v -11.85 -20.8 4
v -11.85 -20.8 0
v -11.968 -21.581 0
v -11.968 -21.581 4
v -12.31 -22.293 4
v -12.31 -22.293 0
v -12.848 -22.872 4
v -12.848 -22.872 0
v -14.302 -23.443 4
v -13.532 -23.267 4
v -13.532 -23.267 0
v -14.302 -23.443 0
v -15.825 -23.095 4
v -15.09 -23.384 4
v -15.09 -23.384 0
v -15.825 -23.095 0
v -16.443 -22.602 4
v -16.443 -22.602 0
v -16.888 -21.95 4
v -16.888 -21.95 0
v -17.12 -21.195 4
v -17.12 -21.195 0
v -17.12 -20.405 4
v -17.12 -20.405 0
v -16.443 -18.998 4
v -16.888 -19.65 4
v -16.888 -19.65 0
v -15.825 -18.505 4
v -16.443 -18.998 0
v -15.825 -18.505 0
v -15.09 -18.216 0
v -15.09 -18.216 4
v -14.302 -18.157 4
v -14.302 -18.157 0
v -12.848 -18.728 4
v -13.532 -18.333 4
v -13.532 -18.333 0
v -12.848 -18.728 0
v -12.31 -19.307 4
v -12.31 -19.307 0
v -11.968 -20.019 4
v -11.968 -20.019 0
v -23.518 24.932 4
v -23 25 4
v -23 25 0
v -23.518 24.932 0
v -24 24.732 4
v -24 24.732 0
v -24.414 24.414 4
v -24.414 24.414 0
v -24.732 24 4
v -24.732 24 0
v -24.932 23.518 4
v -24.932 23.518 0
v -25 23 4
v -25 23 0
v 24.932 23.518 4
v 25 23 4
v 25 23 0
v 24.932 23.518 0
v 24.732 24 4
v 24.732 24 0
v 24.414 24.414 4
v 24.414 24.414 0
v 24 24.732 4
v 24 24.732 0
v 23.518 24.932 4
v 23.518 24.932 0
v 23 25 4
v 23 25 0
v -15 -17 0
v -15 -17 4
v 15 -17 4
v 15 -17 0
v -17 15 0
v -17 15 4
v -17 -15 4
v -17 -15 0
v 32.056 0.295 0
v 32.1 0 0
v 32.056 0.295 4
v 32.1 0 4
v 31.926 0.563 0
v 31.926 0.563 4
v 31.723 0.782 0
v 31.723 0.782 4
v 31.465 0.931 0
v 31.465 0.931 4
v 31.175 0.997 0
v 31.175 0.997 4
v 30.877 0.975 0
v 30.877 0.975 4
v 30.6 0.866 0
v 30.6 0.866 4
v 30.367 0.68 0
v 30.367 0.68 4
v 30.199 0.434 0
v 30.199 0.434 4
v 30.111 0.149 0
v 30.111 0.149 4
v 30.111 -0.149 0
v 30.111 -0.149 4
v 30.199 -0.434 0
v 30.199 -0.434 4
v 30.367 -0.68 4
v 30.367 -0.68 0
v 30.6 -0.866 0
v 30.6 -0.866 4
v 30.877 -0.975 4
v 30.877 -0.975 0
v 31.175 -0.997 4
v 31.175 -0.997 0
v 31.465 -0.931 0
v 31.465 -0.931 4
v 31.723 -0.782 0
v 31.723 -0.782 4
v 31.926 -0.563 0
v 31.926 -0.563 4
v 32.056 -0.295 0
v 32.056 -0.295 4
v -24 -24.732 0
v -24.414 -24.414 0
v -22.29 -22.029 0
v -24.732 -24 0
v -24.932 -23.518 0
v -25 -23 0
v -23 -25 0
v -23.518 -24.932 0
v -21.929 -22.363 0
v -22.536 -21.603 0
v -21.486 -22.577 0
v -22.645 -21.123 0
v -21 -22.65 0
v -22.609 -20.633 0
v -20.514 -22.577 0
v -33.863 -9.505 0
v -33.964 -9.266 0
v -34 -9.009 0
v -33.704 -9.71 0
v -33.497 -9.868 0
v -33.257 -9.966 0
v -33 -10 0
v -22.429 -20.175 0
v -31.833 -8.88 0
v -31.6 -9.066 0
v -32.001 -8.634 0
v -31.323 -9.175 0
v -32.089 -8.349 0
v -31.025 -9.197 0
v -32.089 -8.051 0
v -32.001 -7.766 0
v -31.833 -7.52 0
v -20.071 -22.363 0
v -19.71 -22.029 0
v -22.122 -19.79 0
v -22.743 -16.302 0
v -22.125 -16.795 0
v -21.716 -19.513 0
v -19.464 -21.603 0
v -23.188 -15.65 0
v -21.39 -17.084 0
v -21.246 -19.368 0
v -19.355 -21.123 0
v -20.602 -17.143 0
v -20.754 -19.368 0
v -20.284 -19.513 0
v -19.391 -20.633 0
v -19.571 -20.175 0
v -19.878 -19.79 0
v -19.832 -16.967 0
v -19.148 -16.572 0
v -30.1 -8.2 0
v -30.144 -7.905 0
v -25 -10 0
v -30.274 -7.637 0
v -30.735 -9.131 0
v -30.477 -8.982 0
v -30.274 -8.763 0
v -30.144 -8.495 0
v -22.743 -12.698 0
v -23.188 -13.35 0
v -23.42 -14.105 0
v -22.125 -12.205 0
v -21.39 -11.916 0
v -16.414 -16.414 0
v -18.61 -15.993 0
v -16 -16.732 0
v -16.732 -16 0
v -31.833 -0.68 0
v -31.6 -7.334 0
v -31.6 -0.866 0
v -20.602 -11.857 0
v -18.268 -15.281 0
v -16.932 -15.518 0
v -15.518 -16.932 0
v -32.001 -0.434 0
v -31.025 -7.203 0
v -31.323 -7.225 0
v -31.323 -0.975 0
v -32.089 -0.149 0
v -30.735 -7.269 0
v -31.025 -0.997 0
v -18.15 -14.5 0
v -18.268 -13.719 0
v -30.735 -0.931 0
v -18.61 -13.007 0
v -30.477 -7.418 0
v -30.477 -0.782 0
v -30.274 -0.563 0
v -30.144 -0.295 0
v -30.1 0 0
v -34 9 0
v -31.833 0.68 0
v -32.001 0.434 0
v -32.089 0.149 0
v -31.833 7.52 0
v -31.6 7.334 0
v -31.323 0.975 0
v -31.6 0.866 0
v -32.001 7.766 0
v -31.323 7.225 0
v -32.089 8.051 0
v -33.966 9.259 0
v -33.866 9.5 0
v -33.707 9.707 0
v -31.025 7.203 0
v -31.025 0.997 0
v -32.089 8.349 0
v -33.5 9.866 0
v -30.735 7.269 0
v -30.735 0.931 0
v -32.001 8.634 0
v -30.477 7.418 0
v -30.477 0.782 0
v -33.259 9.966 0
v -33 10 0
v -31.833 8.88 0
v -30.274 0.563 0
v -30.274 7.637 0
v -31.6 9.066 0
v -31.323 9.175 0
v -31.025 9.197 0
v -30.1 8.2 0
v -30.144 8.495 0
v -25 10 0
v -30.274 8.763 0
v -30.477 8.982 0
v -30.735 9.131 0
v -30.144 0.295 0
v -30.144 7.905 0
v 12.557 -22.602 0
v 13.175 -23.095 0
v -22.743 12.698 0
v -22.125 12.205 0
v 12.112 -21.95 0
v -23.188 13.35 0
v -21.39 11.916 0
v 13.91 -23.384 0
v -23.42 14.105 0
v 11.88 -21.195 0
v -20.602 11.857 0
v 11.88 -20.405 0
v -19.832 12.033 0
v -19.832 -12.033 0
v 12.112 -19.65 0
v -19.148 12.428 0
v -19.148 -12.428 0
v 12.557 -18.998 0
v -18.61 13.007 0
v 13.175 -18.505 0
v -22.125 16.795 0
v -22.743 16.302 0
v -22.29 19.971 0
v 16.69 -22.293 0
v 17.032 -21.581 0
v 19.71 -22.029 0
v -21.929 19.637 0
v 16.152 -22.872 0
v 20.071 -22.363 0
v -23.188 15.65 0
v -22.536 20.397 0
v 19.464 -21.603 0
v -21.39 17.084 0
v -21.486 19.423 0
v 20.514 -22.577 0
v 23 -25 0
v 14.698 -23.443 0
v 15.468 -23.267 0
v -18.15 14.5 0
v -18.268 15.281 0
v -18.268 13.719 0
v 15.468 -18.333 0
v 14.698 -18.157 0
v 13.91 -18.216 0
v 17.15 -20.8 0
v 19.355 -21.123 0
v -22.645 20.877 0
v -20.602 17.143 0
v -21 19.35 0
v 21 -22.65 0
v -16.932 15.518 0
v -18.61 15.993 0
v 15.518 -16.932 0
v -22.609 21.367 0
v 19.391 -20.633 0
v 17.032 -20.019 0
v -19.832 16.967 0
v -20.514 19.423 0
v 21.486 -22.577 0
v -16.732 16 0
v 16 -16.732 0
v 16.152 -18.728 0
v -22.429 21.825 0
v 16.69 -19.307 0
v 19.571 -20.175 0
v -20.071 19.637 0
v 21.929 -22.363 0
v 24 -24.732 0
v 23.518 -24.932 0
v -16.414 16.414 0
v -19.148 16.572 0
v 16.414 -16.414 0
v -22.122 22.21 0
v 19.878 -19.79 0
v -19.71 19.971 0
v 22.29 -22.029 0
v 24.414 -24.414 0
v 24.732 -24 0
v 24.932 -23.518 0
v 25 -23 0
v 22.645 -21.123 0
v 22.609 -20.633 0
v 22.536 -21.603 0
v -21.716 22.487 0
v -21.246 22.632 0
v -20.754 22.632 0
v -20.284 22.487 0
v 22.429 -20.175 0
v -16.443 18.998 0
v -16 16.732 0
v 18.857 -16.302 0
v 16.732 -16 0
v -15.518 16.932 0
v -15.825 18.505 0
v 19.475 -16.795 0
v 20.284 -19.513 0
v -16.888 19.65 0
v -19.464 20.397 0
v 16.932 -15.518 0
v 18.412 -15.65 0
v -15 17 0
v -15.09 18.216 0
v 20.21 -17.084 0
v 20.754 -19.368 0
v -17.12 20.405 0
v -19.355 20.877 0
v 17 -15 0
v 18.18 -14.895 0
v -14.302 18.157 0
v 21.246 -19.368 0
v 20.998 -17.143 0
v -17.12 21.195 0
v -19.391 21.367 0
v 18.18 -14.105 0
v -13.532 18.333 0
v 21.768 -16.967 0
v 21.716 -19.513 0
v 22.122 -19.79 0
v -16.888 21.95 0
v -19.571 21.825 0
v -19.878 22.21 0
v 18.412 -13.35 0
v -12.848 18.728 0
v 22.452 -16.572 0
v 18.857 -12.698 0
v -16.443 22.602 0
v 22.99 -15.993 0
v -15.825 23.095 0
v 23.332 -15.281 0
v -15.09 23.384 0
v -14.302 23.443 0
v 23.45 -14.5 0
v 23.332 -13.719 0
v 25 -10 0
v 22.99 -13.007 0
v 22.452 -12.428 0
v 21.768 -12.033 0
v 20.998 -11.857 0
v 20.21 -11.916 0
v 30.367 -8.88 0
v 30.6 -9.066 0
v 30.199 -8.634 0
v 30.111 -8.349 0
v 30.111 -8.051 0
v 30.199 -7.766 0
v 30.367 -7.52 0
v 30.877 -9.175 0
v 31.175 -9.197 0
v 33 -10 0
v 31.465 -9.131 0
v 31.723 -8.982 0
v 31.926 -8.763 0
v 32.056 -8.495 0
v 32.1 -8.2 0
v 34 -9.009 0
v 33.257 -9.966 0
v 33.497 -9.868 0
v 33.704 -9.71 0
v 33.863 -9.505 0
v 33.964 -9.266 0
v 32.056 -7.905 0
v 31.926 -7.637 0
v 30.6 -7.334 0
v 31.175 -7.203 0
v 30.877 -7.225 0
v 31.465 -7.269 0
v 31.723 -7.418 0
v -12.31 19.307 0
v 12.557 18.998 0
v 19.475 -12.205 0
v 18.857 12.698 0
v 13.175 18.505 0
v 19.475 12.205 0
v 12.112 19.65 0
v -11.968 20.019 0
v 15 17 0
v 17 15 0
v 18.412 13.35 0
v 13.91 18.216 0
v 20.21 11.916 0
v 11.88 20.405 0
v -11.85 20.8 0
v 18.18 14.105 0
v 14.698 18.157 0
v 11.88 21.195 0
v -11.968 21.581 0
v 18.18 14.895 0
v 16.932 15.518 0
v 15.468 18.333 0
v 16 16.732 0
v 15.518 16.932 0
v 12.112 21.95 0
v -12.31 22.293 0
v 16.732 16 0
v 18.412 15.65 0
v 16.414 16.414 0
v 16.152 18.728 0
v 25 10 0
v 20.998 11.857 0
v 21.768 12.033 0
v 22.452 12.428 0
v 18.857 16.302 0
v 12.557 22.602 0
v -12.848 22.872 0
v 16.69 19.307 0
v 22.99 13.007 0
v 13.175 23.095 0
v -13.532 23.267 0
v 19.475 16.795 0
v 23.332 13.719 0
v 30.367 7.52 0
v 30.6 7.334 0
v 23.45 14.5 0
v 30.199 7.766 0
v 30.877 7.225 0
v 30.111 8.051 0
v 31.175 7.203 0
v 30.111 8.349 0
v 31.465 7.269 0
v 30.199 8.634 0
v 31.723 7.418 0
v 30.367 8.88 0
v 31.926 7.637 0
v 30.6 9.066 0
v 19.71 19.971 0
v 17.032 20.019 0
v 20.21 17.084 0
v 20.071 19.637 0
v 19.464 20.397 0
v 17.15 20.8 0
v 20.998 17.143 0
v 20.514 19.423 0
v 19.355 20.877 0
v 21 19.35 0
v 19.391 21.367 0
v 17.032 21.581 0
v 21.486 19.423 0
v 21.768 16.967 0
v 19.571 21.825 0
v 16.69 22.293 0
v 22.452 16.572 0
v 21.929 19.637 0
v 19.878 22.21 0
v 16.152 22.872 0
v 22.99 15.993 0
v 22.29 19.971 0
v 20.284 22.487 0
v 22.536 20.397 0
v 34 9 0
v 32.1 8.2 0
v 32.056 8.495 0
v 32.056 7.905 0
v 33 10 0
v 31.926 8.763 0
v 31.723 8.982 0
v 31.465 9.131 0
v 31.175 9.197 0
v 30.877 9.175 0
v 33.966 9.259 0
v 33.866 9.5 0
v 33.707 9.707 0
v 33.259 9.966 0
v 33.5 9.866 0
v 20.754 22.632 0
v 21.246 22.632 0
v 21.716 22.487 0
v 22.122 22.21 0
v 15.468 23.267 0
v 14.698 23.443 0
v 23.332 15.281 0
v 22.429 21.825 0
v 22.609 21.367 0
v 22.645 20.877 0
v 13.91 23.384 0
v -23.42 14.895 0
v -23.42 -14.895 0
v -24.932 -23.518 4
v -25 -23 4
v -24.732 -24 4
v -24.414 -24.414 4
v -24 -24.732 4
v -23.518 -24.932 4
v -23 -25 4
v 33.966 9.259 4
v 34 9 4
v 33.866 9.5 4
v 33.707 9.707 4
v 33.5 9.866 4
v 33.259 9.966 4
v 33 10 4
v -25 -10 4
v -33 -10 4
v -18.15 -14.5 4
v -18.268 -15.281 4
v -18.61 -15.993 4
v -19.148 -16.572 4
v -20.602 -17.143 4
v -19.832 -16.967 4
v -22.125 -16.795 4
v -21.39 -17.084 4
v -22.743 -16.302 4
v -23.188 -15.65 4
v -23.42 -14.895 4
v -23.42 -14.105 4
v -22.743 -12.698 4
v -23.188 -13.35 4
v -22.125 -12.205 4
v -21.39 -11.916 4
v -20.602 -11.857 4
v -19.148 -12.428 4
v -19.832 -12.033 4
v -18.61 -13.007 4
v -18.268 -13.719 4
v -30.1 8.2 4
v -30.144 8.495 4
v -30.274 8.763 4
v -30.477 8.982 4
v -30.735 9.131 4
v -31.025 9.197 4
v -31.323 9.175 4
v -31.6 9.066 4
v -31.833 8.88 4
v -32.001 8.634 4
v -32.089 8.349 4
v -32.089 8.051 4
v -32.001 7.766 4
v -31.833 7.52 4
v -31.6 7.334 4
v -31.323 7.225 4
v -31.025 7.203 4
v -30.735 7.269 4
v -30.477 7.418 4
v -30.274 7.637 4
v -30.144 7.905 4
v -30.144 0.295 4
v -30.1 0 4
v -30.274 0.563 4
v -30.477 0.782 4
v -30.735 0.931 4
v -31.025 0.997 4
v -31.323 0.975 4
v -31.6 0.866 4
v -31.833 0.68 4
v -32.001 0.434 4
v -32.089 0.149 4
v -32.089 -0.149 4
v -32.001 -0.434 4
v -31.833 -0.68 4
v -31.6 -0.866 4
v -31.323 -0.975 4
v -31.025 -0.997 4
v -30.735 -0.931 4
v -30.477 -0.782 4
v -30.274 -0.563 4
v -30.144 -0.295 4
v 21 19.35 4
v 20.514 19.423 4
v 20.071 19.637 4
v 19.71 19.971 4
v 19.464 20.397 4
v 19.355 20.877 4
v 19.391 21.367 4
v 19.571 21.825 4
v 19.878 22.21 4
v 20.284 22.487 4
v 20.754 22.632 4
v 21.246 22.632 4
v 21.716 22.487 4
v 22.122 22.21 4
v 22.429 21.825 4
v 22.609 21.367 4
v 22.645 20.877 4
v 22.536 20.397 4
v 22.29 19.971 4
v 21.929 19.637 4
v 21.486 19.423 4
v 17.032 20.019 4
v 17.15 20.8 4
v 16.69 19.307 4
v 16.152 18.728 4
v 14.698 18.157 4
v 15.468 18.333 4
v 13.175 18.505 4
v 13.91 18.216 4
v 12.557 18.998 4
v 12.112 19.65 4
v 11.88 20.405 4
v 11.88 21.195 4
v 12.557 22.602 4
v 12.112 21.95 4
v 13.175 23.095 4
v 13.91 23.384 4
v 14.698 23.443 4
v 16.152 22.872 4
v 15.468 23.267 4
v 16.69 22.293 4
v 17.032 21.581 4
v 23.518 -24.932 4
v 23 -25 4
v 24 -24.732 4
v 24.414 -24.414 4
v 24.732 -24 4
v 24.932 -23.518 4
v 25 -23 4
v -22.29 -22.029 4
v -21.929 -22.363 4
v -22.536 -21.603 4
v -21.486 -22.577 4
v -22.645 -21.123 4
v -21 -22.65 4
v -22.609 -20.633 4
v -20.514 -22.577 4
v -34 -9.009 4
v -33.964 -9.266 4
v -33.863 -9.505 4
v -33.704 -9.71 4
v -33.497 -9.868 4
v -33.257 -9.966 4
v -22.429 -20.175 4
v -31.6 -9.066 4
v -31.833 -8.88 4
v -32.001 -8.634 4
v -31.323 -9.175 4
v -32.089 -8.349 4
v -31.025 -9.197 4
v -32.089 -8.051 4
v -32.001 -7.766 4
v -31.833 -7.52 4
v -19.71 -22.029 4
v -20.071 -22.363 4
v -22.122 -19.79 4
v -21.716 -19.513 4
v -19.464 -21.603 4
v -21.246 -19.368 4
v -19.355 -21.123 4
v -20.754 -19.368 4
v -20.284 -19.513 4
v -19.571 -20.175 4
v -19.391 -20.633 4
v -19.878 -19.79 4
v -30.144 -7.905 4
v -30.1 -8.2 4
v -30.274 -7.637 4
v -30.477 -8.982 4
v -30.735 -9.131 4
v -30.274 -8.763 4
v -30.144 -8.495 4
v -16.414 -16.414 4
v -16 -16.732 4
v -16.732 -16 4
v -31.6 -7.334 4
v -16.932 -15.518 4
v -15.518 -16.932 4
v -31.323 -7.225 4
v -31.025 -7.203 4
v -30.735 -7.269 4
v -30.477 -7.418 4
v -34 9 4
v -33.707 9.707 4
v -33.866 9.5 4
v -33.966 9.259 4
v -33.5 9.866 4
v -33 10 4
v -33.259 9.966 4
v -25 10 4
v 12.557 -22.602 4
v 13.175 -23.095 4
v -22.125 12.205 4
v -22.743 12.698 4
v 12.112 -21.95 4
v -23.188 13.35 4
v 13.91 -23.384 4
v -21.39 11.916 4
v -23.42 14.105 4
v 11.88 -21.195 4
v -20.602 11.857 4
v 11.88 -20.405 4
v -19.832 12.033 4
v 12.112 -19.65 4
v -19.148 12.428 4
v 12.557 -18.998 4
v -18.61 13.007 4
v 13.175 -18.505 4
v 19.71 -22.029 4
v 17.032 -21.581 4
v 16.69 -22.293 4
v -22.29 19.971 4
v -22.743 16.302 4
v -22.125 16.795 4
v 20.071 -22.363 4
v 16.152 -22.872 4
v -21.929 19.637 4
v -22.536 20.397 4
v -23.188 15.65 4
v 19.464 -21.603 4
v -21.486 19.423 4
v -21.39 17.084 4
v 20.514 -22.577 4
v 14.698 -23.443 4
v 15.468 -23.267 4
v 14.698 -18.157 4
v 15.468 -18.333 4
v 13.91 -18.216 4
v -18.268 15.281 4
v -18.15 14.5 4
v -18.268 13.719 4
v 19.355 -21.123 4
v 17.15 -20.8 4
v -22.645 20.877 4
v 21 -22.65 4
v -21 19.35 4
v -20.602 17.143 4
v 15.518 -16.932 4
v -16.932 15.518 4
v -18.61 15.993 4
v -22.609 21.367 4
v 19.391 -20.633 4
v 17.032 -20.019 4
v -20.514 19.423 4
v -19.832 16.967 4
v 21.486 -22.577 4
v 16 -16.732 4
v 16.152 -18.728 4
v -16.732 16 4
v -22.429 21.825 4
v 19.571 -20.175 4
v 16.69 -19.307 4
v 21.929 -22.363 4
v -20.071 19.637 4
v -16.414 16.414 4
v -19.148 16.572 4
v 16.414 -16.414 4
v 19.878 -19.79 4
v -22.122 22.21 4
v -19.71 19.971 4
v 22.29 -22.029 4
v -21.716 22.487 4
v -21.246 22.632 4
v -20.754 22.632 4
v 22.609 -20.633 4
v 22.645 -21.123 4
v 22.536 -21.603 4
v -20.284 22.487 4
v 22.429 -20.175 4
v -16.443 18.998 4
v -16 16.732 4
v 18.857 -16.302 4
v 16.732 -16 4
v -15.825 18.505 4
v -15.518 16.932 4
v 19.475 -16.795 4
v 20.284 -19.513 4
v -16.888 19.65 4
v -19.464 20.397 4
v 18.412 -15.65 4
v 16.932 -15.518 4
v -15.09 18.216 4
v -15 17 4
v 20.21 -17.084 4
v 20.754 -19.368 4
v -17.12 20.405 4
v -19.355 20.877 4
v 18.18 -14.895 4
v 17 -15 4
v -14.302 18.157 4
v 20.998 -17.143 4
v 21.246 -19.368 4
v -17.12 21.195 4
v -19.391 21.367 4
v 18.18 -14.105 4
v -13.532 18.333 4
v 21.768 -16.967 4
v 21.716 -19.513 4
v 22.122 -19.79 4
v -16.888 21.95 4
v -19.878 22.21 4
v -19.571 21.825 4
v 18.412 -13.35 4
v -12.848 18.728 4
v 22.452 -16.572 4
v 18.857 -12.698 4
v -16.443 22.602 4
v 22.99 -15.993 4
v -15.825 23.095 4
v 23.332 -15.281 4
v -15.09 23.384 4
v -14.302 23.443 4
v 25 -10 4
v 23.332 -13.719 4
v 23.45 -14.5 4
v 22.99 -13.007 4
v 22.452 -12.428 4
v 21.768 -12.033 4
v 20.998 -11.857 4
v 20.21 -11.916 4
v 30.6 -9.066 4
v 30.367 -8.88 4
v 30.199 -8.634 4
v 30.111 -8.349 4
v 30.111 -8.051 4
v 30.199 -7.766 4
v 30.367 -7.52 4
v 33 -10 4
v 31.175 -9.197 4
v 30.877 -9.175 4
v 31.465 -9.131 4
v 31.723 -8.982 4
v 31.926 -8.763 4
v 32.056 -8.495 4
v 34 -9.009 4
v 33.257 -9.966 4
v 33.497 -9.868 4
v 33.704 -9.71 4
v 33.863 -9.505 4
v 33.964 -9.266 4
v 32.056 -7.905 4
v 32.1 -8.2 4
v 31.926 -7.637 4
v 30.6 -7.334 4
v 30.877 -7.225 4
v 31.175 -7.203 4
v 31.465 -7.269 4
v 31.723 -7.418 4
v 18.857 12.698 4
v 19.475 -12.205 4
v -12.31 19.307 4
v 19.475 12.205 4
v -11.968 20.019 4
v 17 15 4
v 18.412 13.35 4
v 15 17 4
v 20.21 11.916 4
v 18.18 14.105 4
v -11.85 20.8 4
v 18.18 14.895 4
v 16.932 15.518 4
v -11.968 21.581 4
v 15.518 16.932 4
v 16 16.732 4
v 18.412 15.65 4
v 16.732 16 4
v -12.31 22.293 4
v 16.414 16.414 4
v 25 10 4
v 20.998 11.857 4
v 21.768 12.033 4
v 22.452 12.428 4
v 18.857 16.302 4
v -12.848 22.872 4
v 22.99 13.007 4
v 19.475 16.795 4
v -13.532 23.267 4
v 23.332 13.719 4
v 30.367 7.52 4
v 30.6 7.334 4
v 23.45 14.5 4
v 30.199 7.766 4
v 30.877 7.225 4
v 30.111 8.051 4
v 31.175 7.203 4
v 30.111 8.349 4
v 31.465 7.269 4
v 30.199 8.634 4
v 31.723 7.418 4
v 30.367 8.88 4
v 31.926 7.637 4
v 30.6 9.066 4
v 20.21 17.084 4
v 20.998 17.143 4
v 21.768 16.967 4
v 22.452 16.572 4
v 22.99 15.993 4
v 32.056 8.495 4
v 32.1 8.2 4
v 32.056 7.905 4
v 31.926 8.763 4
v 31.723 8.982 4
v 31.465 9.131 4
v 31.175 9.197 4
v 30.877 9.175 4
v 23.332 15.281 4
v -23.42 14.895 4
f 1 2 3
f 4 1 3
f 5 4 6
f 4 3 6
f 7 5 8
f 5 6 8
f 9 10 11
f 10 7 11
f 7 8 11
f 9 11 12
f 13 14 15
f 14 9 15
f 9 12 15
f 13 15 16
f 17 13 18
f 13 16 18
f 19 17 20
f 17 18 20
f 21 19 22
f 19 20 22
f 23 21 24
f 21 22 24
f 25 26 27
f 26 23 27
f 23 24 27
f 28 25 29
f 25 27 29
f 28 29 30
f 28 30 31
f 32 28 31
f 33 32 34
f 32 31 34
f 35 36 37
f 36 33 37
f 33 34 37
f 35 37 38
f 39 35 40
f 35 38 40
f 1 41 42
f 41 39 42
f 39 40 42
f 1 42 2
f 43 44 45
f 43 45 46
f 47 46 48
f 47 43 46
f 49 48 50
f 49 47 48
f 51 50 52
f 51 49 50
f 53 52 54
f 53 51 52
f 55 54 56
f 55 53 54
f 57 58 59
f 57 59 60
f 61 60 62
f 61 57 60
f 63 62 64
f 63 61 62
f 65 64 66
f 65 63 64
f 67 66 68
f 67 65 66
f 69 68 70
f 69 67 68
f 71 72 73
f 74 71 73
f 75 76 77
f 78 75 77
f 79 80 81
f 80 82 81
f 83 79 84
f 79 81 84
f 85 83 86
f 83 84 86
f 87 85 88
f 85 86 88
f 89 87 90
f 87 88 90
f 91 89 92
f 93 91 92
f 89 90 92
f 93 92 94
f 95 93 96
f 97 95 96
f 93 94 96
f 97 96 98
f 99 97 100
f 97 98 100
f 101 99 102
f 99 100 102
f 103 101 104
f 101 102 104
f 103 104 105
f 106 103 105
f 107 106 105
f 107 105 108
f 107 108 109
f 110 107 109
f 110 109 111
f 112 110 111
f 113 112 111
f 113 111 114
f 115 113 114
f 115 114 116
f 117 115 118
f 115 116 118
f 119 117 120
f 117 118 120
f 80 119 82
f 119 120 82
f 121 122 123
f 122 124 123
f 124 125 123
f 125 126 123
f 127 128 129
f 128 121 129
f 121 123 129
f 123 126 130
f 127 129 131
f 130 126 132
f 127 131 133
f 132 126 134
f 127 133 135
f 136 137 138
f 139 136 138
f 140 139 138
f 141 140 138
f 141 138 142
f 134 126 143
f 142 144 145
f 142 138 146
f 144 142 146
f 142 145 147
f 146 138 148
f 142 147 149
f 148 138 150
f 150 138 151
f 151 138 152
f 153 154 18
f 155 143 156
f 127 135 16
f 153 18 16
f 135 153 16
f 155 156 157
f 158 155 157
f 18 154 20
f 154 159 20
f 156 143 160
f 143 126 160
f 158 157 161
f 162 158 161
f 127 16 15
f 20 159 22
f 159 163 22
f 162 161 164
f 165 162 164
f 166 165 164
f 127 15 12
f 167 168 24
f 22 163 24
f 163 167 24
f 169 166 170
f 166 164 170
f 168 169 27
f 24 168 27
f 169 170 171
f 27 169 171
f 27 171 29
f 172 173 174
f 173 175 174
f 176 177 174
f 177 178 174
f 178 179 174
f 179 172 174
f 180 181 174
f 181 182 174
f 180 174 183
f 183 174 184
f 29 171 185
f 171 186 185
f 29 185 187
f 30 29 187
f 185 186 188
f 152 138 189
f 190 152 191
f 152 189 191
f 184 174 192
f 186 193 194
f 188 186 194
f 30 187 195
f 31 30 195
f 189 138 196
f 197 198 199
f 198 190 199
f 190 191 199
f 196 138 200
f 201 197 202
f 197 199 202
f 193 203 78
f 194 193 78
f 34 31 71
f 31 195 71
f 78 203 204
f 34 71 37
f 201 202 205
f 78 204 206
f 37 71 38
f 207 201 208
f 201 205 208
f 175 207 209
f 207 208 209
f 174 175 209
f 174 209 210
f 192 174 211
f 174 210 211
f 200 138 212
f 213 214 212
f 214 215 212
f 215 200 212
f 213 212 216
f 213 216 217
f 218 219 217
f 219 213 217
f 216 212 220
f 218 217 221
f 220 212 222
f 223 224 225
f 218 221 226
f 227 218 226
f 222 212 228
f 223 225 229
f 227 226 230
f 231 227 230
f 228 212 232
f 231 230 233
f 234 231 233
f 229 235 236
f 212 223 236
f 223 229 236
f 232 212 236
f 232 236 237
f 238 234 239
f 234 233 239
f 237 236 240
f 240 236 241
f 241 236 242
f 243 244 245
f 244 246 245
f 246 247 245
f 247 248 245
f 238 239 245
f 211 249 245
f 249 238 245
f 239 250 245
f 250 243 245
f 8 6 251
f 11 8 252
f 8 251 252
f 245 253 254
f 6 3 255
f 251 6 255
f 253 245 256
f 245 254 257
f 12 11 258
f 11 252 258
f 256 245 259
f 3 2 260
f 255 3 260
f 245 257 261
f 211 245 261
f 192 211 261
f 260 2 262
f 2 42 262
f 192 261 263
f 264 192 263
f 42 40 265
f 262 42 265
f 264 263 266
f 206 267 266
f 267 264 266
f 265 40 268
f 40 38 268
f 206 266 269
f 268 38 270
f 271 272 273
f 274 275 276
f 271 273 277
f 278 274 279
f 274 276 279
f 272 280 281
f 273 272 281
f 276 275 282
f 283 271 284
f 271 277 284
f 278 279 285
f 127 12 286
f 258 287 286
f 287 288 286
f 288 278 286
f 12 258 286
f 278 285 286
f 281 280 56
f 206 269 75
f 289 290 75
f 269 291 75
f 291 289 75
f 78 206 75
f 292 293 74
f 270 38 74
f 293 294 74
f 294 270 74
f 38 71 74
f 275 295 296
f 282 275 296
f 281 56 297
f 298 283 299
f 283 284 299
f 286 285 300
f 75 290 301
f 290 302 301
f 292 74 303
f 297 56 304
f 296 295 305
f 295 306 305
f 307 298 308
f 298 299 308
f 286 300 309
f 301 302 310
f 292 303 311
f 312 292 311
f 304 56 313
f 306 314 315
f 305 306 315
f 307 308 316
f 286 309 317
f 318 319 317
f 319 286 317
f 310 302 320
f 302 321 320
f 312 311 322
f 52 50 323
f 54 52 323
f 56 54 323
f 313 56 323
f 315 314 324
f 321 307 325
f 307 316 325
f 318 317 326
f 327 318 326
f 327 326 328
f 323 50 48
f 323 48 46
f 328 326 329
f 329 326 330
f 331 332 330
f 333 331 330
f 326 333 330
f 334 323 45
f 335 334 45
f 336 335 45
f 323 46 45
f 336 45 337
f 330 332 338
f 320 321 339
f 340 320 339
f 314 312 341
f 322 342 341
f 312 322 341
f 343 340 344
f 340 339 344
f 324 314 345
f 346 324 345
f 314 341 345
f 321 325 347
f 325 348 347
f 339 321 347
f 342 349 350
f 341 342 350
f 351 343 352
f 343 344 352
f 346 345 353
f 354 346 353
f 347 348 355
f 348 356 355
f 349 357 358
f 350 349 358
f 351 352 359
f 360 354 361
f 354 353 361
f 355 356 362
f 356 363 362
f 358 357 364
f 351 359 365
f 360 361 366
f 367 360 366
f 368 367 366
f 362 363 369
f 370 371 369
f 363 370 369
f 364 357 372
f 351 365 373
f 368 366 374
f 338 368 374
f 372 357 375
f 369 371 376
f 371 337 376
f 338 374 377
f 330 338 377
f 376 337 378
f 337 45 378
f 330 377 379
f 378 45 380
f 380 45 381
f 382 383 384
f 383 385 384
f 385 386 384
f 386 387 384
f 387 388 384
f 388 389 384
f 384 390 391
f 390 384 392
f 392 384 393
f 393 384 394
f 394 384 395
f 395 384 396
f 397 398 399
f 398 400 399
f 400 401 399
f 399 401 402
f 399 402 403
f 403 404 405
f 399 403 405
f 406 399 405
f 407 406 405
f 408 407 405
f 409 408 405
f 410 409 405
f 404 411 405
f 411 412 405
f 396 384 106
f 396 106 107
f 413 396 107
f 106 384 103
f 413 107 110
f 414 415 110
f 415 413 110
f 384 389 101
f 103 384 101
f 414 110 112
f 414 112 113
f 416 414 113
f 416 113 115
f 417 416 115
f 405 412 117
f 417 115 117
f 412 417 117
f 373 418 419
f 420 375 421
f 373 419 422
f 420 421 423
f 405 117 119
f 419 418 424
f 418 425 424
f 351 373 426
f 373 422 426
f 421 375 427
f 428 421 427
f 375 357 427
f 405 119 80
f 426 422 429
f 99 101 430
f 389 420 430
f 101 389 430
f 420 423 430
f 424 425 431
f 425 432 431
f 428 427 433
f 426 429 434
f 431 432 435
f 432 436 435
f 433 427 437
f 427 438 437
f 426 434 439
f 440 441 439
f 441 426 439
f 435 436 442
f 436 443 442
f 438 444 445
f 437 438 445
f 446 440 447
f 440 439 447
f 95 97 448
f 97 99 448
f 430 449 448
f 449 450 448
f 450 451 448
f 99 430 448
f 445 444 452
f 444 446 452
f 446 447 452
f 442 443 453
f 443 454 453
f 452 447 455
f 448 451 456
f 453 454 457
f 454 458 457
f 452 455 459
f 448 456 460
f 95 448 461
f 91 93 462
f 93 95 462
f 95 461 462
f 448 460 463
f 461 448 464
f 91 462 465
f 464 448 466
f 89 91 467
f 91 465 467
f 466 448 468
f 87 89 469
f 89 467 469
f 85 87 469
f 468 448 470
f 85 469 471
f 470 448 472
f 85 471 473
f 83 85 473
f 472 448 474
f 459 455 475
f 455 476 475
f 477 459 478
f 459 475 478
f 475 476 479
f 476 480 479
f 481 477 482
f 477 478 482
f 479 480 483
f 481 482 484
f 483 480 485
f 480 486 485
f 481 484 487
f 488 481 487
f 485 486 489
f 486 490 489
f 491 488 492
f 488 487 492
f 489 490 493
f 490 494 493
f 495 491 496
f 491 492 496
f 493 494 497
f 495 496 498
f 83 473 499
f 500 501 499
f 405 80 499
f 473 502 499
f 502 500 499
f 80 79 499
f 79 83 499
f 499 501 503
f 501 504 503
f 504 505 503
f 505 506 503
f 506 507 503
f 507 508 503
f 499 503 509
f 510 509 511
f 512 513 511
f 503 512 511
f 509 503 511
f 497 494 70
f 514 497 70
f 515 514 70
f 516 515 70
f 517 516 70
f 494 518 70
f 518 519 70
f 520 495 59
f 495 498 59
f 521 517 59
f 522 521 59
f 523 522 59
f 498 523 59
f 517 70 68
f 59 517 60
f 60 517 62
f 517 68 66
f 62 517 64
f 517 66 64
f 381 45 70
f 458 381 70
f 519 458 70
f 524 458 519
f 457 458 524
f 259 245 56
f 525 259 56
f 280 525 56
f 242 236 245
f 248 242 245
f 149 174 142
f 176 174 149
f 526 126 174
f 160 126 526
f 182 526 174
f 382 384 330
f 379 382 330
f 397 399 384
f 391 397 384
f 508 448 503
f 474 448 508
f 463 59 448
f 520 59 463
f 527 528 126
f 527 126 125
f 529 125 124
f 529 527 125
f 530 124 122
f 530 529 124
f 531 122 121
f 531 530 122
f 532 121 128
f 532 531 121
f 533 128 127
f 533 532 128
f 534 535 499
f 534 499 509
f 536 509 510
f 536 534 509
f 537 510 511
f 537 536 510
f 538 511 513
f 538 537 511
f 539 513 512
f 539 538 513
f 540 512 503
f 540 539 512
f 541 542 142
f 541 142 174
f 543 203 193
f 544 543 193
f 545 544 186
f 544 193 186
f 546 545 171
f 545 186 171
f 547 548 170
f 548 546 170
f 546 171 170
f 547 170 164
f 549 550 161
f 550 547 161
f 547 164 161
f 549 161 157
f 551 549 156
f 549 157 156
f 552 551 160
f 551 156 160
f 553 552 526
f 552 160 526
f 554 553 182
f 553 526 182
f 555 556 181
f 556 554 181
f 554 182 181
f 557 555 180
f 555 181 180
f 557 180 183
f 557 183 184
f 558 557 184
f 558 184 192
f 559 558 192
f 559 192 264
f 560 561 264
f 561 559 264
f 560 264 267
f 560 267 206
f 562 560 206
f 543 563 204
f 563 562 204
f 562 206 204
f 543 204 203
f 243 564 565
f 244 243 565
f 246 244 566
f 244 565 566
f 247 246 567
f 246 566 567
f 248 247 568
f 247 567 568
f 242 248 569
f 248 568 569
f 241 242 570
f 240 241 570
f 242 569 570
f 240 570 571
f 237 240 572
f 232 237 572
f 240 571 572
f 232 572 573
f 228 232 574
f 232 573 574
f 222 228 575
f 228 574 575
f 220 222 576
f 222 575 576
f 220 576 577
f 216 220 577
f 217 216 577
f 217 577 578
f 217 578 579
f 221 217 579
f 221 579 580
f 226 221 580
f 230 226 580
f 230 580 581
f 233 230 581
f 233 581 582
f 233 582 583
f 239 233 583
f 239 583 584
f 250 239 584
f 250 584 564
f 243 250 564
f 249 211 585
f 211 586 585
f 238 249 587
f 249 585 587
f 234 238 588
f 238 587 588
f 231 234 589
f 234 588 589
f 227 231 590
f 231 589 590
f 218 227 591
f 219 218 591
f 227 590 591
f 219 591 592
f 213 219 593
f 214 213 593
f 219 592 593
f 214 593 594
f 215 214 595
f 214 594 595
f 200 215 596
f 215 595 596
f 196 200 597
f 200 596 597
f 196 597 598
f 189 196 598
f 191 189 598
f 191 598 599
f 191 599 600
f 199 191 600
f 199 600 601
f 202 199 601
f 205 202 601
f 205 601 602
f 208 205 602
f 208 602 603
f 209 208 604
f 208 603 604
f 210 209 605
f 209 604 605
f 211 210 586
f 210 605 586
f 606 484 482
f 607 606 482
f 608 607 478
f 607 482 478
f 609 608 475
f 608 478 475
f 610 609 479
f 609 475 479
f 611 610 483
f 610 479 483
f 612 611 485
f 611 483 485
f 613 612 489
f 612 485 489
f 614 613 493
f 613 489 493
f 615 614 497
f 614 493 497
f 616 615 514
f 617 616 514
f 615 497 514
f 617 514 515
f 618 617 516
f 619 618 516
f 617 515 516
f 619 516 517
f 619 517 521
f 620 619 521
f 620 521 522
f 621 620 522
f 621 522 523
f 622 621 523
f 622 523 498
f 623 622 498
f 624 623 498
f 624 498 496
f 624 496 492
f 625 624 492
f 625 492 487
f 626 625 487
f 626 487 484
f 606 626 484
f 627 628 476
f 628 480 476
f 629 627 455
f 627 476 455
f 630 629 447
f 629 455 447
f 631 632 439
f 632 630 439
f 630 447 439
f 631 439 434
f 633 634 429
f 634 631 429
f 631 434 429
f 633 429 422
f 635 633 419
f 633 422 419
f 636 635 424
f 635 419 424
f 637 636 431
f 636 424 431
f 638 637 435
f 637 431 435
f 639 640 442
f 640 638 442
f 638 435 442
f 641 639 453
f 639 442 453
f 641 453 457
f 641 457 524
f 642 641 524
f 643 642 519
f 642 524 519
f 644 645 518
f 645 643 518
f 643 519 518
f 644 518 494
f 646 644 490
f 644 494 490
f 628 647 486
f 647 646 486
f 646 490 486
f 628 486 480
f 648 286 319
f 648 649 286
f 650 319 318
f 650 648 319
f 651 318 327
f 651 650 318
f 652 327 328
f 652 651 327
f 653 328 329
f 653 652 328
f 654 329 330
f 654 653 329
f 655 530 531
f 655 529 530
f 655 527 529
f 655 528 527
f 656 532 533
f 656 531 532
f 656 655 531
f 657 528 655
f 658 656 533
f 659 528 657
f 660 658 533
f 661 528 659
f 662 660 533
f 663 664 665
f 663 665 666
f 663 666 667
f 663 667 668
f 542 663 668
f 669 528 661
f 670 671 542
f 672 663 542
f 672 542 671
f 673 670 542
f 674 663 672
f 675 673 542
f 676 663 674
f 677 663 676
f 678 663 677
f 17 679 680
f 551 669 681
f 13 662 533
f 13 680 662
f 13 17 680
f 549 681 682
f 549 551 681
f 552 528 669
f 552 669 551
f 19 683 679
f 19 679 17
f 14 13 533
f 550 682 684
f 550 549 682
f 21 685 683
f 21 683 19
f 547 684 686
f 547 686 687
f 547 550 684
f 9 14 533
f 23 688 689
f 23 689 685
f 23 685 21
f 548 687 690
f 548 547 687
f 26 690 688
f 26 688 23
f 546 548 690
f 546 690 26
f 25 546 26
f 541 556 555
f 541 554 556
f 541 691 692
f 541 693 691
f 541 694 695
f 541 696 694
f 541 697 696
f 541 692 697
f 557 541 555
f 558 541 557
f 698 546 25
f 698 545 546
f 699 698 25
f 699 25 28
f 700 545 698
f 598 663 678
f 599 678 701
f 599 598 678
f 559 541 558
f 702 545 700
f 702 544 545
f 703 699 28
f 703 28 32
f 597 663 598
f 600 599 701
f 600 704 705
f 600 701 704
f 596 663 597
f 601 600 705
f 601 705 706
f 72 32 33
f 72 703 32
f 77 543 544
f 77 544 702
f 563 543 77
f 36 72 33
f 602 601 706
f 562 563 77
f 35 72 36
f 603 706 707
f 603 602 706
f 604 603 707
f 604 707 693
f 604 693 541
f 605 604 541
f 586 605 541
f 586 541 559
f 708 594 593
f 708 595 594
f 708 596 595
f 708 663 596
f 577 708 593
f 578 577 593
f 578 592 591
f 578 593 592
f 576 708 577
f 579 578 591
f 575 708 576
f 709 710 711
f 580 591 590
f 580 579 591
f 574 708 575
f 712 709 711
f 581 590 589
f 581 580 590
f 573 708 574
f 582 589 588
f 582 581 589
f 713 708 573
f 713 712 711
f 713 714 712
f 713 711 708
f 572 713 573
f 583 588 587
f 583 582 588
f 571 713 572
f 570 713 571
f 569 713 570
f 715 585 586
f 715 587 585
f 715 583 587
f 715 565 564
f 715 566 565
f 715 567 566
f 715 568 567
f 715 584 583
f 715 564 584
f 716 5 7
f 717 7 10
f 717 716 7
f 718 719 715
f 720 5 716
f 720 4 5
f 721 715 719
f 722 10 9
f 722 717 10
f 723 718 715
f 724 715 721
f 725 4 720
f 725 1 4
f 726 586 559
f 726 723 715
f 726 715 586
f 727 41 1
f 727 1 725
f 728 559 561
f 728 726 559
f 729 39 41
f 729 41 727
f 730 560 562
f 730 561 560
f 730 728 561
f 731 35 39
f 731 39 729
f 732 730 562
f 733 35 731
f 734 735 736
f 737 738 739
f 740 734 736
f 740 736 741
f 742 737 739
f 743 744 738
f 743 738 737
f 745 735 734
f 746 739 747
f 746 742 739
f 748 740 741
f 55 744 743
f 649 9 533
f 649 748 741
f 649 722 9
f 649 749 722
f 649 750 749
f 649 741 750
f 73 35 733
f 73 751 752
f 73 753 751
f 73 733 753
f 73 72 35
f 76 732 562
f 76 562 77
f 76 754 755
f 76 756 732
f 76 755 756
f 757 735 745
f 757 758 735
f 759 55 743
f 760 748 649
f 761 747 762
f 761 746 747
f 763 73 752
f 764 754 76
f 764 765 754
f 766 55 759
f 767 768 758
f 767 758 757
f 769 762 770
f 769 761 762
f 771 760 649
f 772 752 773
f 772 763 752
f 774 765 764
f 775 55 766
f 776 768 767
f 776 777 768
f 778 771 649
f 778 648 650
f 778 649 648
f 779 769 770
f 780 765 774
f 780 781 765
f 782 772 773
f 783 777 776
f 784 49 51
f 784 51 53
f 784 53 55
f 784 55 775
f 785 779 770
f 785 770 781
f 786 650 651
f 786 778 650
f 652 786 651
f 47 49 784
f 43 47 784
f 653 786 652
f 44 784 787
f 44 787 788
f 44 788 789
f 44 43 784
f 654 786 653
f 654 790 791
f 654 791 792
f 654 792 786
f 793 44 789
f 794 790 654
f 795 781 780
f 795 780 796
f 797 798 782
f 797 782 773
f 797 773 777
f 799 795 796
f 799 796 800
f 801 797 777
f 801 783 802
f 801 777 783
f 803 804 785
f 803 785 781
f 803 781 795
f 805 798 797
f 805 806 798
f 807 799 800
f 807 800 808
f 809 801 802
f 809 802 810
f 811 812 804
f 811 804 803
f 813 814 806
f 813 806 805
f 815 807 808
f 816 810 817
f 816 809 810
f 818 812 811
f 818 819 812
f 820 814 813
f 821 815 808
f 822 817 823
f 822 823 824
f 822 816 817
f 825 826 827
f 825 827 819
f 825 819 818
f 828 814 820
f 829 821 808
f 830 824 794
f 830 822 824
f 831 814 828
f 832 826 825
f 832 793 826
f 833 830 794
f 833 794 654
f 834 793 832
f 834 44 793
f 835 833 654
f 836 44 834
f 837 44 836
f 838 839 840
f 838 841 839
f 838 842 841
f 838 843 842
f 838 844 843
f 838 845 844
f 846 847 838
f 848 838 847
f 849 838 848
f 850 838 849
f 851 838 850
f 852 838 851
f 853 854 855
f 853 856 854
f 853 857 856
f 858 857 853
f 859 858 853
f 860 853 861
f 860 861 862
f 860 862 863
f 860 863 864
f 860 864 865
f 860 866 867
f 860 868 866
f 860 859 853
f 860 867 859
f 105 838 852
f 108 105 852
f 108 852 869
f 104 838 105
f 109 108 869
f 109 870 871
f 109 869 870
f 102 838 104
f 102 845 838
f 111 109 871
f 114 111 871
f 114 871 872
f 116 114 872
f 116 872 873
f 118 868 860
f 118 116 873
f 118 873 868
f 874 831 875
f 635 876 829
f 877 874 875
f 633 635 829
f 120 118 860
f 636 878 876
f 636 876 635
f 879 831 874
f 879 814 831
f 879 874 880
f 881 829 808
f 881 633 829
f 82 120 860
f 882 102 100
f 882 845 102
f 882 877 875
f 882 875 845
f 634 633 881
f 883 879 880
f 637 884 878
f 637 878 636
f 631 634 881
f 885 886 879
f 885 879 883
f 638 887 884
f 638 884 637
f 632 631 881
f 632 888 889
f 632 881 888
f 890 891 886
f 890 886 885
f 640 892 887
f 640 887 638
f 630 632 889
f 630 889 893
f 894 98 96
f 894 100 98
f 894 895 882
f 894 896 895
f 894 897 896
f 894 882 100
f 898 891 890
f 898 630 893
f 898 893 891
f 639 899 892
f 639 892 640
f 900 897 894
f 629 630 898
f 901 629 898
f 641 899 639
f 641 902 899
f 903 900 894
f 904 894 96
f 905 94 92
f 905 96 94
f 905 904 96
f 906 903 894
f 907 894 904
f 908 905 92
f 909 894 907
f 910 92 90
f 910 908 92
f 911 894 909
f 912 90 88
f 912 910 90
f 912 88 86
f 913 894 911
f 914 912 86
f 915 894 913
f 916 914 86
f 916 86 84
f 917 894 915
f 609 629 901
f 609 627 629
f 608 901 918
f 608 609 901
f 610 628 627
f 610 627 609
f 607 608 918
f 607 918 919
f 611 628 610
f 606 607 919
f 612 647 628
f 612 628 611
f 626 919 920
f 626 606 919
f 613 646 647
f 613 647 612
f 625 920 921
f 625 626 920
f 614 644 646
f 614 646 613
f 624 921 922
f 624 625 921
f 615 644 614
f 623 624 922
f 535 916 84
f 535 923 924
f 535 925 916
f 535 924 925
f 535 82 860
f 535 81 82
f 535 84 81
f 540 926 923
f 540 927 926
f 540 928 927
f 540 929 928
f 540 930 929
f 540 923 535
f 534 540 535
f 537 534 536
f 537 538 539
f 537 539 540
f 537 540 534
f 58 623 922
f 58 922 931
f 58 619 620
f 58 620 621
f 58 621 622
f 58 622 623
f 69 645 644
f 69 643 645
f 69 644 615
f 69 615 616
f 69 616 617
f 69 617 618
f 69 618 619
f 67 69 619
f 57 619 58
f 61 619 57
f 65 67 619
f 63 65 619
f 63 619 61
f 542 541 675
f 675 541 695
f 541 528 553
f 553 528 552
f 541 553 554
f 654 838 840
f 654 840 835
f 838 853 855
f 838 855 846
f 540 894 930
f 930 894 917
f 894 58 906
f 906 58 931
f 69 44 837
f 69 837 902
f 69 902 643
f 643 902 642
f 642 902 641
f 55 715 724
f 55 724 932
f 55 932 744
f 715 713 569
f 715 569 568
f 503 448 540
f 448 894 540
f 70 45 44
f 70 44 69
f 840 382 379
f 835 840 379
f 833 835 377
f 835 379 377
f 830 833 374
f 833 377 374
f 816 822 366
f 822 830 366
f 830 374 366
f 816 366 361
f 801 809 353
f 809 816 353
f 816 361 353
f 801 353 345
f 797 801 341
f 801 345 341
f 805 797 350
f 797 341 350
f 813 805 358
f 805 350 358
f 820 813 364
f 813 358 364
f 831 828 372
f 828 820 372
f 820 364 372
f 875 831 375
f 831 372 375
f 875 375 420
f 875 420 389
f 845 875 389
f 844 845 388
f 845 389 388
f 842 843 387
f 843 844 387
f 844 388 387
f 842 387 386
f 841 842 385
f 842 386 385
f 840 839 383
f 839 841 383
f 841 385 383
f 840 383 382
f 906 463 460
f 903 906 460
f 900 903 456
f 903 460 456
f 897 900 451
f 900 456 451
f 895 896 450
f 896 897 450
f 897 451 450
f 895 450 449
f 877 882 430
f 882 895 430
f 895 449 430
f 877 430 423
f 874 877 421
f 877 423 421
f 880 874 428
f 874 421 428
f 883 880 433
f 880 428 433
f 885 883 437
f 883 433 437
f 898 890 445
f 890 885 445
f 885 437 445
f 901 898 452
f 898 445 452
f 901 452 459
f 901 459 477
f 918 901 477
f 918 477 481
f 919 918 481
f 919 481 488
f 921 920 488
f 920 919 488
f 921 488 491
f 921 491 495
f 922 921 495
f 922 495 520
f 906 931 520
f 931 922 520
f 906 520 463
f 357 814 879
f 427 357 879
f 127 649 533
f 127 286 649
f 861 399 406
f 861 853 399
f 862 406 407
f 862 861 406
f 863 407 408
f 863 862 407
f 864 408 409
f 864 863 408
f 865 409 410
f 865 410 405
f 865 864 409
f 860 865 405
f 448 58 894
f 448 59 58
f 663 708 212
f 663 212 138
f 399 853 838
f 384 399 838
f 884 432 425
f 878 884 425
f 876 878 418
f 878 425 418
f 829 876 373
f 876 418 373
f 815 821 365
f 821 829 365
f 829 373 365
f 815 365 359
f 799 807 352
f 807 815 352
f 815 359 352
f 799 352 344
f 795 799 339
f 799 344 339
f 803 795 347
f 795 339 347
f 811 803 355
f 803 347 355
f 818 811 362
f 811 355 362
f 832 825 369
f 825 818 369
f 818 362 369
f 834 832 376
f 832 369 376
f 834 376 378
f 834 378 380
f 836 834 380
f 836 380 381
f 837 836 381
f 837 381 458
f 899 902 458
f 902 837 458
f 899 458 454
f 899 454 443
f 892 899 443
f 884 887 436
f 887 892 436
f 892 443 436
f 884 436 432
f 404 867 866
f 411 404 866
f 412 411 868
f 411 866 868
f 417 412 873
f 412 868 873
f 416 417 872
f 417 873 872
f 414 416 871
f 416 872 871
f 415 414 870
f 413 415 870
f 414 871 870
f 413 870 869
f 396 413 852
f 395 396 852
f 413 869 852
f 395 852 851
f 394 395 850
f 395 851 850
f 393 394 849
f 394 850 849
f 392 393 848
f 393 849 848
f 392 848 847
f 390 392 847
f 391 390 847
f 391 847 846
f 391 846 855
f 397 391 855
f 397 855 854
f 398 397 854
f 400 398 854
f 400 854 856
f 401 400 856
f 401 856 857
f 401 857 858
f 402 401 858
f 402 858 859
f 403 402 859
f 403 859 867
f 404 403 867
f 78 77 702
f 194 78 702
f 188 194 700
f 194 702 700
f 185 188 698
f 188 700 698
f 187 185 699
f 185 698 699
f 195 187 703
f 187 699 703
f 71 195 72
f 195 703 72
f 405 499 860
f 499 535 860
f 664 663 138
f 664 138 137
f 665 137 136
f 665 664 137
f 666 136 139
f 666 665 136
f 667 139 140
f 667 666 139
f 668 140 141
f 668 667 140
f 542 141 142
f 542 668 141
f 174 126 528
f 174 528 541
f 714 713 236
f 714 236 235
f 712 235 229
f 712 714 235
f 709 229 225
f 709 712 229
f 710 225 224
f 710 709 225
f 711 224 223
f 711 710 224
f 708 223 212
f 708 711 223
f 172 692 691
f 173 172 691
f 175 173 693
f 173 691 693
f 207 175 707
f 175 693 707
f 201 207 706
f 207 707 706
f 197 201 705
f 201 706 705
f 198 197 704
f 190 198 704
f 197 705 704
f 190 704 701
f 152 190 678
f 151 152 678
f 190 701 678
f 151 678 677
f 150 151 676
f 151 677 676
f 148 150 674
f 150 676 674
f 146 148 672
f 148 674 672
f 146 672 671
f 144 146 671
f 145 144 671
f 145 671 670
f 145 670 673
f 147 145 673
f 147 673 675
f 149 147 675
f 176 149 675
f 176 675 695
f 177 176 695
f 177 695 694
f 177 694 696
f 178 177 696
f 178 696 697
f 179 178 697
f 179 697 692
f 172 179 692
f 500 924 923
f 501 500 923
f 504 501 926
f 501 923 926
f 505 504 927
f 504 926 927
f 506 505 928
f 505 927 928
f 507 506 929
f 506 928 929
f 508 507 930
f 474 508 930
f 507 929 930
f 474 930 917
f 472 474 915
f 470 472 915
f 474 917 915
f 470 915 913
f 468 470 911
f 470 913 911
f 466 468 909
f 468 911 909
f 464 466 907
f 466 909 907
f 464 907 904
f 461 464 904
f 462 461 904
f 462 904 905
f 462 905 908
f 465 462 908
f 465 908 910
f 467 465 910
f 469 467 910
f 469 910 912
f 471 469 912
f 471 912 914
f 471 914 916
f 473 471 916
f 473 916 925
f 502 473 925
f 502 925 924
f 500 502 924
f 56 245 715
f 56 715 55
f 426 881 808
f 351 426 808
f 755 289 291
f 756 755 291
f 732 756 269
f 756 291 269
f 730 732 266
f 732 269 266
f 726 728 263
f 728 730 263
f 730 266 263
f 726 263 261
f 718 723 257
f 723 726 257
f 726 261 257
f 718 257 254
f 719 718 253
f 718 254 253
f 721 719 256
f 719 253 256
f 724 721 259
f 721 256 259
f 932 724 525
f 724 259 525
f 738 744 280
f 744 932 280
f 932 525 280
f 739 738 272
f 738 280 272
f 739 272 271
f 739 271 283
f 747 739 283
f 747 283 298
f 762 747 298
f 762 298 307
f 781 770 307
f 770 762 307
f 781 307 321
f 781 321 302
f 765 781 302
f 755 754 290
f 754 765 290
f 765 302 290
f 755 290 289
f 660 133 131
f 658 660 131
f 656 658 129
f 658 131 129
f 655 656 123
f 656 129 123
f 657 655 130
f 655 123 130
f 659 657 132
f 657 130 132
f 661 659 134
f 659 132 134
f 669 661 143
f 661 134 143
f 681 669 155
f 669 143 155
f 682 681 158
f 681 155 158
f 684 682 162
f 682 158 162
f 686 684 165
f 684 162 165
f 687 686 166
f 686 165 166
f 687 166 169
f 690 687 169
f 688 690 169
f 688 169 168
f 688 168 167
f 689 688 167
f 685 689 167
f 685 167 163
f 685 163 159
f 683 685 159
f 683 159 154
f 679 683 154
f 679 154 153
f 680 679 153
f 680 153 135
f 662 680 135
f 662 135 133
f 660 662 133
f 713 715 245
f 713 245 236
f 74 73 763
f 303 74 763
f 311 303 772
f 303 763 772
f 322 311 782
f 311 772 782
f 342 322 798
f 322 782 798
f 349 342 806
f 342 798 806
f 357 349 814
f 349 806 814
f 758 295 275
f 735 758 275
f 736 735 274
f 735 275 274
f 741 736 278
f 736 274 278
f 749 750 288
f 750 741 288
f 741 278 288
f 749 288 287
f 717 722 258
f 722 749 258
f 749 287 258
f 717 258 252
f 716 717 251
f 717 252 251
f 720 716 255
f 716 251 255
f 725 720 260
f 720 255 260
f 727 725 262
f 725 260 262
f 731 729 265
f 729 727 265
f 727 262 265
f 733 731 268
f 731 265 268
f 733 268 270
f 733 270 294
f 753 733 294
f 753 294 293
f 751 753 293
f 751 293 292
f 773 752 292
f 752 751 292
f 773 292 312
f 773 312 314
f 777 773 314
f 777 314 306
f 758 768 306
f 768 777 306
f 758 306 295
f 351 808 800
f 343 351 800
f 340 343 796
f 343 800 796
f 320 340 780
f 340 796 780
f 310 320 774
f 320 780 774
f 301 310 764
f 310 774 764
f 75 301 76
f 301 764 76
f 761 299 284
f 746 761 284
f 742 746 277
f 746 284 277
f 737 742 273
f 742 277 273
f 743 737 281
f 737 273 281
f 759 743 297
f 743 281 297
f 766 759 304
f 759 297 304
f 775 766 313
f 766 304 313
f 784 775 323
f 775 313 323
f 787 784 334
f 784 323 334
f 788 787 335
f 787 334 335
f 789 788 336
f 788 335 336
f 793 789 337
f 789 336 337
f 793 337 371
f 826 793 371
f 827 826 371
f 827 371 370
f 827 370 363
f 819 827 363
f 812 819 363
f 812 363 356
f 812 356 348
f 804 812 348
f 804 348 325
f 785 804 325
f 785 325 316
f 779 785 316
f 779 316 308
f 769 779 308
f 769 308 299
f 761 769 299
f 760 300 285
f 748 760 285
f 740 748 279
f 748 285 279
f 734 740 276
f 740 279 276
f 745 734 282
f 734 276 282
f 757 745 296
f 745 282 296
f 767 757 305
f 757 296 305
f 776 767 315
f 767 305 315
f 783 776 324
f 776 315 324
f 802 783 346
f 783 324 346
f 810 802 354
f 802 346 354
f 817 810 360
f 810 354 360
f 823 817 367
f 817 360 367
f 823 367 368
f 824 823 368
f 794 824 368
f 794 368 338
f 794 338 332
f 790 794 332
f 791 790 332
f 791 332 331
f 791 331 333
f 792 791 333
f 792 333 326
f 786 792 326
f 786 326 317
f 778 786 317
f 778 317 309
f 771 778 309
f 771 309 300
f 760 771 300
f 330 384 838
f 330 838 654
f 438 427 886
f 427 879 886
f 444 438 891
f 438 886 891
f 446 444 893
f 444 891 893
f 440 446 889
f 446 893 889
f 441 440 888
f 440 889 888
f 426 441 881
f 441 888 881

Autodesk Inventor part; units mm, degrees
ref_plane "YZ Plane" through (0, 0, 0) normal (1, 0, 0) x (0, 1, 0)
ref_plane "XZ Plane" through (0, 0, 0) normal (0, 1, 0) x (-1, 0, 0)
sketch "Sketch1" plane through (0, 0, 0) normal (0, 0, 1) x (1, 0, 0)
  line L0 (-25, 25) -> (25, 25)
  line L1 (25, 25) -> (25, -25)
  line L2 (25, -25) -> (-25, -25)
  line L3 (-25, -25) -> (-25, 25)
  line L4 (-25, 25) -> (25, -25) construction
  line L5 (25, 25) -> (-25, -25) construction
  circle A0 centre (0, 0) radius 2.5
  circle A1 centre (-20.8, -14.5) radius 2.65
  circle A2 centre (-14.5, -20.8) radius 2.65
  circle A3 centre (-20.8, 14.5) radius 2.65
  circle A4 centre (20.8, -14.5) radius 2.65
  circle A5 centre (20.8, 14.5) radius 2.65
  circle A6 centre (-14.5, 20.8) radius 2.65
  circle A7 centre (14.5, -20.8) radius 2.65
  circle A8 centre (14.5, 20.8) radius 2.65
  dimension "d0" = 50
  dimension "d1" = 50
  dimension "d2" = 5
  dimension "d5" = 5.3
  dimension "d6" = 4.2
  dimension "d8" = 10.5
  dimension "d11" = 29
  dimension "d14" = 41.6
extrude "Extrusion1" add sketch "Sketch1" along normal blind 4
fillet "Fillet1" radius 2 4 edges at (-25, 25, 2) (25, 25, 2) (-25, -25, 2) (25, -25, 2)
sketch "Sketch2" plane through (0, 0, 4) normal (0, 0, 1) x (1, 0, 0)
  arc A0 (23, -25) -> (25, -23) centre (23, -23) ccw projected
  line L0 (25, -23) -> (25, 23) projected
  arc A1 (25, 23) -> (23, 25) centre (23, 23) ccw projected
  line L1 (23, 25) -> (-23, 25) projected
  arc A2 (-23, 25) -> (-25, 23) centre (-23, 23) ccw projected
  line L2 (-25, 23) -> (-25, -23) projected
  arc A3 (-25, -23) -> (-23, -25) centre (-23, -23) ccw projected
  line L3 (-23, -25) -> (23, -25) projected
  circle A4 centre (14.5, 20.8) radius 2.65 projected
  circle A5 centre (-14.5, 20.8) radius 2.65 projected
  circle A6 centre (14.5, -20.8) radius 2.65 projected
  circle A7 centre (20.8, 14.5) radius 2.65 projected
  circle A8 centre (20.8, -14.5) radius 2.65 projected
  circle A9 centre (-20.8, 14.5) radius 2.65 projected
  circle A10 centre (-14.5, -20.8) radius 2.65 projected
  circle A11 centre (-20.8, -14.5) radius 2.65 projected
  circle A12 centre (0, 0) radius 2.5 projected
  line L4 (21, -21) -> (-21, -21)
  line L5 (-21, -21) -> (-21, 21)
  line L6 (-21, 21) -> (21, 21)
  line L7 (21, 21) -> (21, -21)
  line L8 (21, -21) -> (-21, 21) construction
  line L9 (-21, -21) -> (21, 21) construction
  circle A13 centre (-28.6, 21.06) radius 1.55 projected
  dimension "d18" = 42
  dimension "d19" = 42
hole "Hole1" at (-21, 21, 4) at (21, 21, 4) at (21, -21, 4) at (-21, -21, 4) direction (0, 0, -1) diameter 3.3 end through all both
sketch "Sketch4" plane through (0, 0, 4) normal (0, 0, 1) x (1, 0, 0)
  circle A0 centre (21, -21) radius 1.65 construction
  circle A1 centre (-21, 21) radius 1.65 construction
  circle A2 centre (21, 21) radius 1.65 construction
  circle A3 centre (-21, -21) radius 1.65 construction
  arc A4 (23, -25) -> (25, -23) centre (23, -23) ccw projected
  line L0 (25, -23) -> (25, 23) projected
  arc A5 (25, 23) -> (23, 25) centre (23, 23) ccw projected
  line L1 (23, 25) -> (-23, 25) projected
  arc A6 (-23, 25) -> (-25, 23) centre (-23, 23) ccw projected
  line L2 (-25, 23) -> (-25, -23) projected
  arc A7 (-25, -23) -> (-23, -25) centre (-23, -23) ccw projected
  line L3 (-23, -25) -> (23, -25) projected
  circle A8 centre (14.5, 20.8) radius 2.65 construction
  circle A9 centre (-14.5, 20.8) radius 2.65 construction
  circle A10 centre (14.5, -20.8) radius 2.65 construction
  circle A11 centre (20.8, 14.5) radius 2.65 construction
  circle A12 centre (20.8, -14.5) radius 2.65 construction
  circle A13 centre (-20.8, 14.5) radius 2.65 construction
  circle A14 centre (-14.5, -20.8) radius 2.65 construction
  circle A15 centre (-20.8, -14.5) radius 2.65 construction
  circle A16 centre (0, 0) radius 2.5 construction
  line L4 (17, -15) -> (17, 15)
  line L5 (15, 17) -> (-15, 17)
  line L6 (-17, 15) -> (-17, -15)
  line L7 (-15, -17) -> (15, -17)
  arc A17 (15, -17) -> (17, -15) centre (15, -15) ccw
  arc A18 (-17, -15) -> (-15, -17) centre (-15, -15) ccw
  arc A19 (-15, 17) -> (-17, 15) centre (-15, 15) ccw
  arc A20 (17, 15) -> (15, 17) centre (15, 15) ccw
  dimension "d34" = 8
  dimension "d35" = 2
extrude "Extrusion2" cut sketch "Sketch4" against normal through all contours A17 L7 A18 L6 A19 L5 A20 L4
sketch "Sketch5" plane through (0, 0, 4) normal (0, 0, 1) x (1, 0, 0)
  arc A0 (17, 15) -> (15, 17) centre (15, 15) ccw construction
  line L0 (17, 15) -> (17, -15) construction
  arc A1 (15, -17) -> (17, -15) centre (15, -15) ccw construction
  line L1 (15, -17) -> (-15, -17) construction
  arc A2 (-17, -15) -> (-15, -17) centre (-15, -15) ccw construction
  line L2 (-17, -15) -> (-17, 15) construction
  arc A3 (-15, 17) -> (-17, 15) centre (-15, 15) ccw construction
  line L3 (-15, 17) -> (15, 17) construction
  circle A4 centre (21, -21) radius 1.65 construction
  circle A5 centre (-21, 21) radius 1.65 construction
  circle A6 centre (21, 21) radius 1.65 construction
  circle A7 centre (-21, -21) radius 1.65 construction
  arc A8 (23, -25) -> (25, -23) centre (23, -23) ccw construction
  line L4 (25, -23) -> (25, 23) construction
  arc A9 (25, 23) -> (23, 25) centre (23, 23) ccw construction
  line L5 (23, 25) -> (-23, 25) construction
  arc A10 (-23, 25) -> (-25, 23) centre (-23, 23) ccw construction
  line L6 (-25, 23) -> (-25, -23) construction
  arc A11 (-25, -23) -> (-23, -25) centre (-23, -23) ccw construction
  line L7 (-23, -25) -> (23, -25) construction
  circle A12 centre (14.5, 20.8) radius 2.65 construction
  circle A13 centre (-14.5, 20.8) radius 2.65 construction
  circle A14 centre (14.5, -20.8) radius 2.65 construction
  circle A15 centre (20.8, 14.5) radius 2.65 construction
  circle A16 centre (20.8, -14.5) radius 2.65 construction
  circle A17 centre (-20.8, 14.5) radius 2.65 construction
  circle A18 centre (-14.5, -20.8) radius 2.65 construction
  circle A19 centre (-20.8, -14.5) radius 2.65 construction
  circle A20 centre (31.1, -8.2) radius 1
  circle A21 centre (31.1, 0) radius 1
  circle A22 centre (31.1, 8.2) radius 1
  line L8 (25, 23) -> (25, -23) projected
  line L9 (33, -10) -> (25, -10)
  line L10 (25, -10) -> (25, 10)
  line L11 (25, 10) -> (33, 10)
  line L12 (0, 45.5) -> (0, -45.5) construction
  arc A23 (33, -10) -> (34, -9.0093) centre (33, -9) ccw
  arc A24 (34, 9) -> (33, 10) centre (33, 9) ccw
  line L13 (45.5, 0) -> (-45.5, 0) construction
  line L14 (-34, -9.0093) -> (-34, 9) construction
  circle A25 centre (-31.1, -8.2) radius 1
  circle A26 centre (-31.1, 0) radius 1
  circle A27 centre (-31.1, 8.2) radius 1
  line L15 (-33, -10) -> (-25, -10)
  line L16 (-25, -10) -> (-25, 10)
  line L17 (-25, 10) -> (-33, 10)
  line L18 (-34, 9) -> (-34, -9.0093)
  arc A28 (-34, -9.0093) -> (-33, -10) centre (-33, -9) ccw
  arc A29 (-33, 10) -> (-34, 9) centre (-33, 9) ccw
  line L19 (34, 9) -> (34, -9.0093)
  point P0 (0, 0)
  point P1 (34, -10)
  point P2 (32.5, 10)
  point P3 (-34, -10)
  point P4 (-32.5, 10)
  dimension "d38" = 20
  dimension "d39" = 1
  dimension "d40" = 1
  dimension "d43" = 9
ref_plane "Work Plane1" through (-32.5, -32.5, -1) normal (0, 0, -1) x (0, 1, 0)
extrude "Extrusion3" add sketch "Sketch5" against normal up to surface (4 mm away)
properties part number "20_IM_LED_holder"
